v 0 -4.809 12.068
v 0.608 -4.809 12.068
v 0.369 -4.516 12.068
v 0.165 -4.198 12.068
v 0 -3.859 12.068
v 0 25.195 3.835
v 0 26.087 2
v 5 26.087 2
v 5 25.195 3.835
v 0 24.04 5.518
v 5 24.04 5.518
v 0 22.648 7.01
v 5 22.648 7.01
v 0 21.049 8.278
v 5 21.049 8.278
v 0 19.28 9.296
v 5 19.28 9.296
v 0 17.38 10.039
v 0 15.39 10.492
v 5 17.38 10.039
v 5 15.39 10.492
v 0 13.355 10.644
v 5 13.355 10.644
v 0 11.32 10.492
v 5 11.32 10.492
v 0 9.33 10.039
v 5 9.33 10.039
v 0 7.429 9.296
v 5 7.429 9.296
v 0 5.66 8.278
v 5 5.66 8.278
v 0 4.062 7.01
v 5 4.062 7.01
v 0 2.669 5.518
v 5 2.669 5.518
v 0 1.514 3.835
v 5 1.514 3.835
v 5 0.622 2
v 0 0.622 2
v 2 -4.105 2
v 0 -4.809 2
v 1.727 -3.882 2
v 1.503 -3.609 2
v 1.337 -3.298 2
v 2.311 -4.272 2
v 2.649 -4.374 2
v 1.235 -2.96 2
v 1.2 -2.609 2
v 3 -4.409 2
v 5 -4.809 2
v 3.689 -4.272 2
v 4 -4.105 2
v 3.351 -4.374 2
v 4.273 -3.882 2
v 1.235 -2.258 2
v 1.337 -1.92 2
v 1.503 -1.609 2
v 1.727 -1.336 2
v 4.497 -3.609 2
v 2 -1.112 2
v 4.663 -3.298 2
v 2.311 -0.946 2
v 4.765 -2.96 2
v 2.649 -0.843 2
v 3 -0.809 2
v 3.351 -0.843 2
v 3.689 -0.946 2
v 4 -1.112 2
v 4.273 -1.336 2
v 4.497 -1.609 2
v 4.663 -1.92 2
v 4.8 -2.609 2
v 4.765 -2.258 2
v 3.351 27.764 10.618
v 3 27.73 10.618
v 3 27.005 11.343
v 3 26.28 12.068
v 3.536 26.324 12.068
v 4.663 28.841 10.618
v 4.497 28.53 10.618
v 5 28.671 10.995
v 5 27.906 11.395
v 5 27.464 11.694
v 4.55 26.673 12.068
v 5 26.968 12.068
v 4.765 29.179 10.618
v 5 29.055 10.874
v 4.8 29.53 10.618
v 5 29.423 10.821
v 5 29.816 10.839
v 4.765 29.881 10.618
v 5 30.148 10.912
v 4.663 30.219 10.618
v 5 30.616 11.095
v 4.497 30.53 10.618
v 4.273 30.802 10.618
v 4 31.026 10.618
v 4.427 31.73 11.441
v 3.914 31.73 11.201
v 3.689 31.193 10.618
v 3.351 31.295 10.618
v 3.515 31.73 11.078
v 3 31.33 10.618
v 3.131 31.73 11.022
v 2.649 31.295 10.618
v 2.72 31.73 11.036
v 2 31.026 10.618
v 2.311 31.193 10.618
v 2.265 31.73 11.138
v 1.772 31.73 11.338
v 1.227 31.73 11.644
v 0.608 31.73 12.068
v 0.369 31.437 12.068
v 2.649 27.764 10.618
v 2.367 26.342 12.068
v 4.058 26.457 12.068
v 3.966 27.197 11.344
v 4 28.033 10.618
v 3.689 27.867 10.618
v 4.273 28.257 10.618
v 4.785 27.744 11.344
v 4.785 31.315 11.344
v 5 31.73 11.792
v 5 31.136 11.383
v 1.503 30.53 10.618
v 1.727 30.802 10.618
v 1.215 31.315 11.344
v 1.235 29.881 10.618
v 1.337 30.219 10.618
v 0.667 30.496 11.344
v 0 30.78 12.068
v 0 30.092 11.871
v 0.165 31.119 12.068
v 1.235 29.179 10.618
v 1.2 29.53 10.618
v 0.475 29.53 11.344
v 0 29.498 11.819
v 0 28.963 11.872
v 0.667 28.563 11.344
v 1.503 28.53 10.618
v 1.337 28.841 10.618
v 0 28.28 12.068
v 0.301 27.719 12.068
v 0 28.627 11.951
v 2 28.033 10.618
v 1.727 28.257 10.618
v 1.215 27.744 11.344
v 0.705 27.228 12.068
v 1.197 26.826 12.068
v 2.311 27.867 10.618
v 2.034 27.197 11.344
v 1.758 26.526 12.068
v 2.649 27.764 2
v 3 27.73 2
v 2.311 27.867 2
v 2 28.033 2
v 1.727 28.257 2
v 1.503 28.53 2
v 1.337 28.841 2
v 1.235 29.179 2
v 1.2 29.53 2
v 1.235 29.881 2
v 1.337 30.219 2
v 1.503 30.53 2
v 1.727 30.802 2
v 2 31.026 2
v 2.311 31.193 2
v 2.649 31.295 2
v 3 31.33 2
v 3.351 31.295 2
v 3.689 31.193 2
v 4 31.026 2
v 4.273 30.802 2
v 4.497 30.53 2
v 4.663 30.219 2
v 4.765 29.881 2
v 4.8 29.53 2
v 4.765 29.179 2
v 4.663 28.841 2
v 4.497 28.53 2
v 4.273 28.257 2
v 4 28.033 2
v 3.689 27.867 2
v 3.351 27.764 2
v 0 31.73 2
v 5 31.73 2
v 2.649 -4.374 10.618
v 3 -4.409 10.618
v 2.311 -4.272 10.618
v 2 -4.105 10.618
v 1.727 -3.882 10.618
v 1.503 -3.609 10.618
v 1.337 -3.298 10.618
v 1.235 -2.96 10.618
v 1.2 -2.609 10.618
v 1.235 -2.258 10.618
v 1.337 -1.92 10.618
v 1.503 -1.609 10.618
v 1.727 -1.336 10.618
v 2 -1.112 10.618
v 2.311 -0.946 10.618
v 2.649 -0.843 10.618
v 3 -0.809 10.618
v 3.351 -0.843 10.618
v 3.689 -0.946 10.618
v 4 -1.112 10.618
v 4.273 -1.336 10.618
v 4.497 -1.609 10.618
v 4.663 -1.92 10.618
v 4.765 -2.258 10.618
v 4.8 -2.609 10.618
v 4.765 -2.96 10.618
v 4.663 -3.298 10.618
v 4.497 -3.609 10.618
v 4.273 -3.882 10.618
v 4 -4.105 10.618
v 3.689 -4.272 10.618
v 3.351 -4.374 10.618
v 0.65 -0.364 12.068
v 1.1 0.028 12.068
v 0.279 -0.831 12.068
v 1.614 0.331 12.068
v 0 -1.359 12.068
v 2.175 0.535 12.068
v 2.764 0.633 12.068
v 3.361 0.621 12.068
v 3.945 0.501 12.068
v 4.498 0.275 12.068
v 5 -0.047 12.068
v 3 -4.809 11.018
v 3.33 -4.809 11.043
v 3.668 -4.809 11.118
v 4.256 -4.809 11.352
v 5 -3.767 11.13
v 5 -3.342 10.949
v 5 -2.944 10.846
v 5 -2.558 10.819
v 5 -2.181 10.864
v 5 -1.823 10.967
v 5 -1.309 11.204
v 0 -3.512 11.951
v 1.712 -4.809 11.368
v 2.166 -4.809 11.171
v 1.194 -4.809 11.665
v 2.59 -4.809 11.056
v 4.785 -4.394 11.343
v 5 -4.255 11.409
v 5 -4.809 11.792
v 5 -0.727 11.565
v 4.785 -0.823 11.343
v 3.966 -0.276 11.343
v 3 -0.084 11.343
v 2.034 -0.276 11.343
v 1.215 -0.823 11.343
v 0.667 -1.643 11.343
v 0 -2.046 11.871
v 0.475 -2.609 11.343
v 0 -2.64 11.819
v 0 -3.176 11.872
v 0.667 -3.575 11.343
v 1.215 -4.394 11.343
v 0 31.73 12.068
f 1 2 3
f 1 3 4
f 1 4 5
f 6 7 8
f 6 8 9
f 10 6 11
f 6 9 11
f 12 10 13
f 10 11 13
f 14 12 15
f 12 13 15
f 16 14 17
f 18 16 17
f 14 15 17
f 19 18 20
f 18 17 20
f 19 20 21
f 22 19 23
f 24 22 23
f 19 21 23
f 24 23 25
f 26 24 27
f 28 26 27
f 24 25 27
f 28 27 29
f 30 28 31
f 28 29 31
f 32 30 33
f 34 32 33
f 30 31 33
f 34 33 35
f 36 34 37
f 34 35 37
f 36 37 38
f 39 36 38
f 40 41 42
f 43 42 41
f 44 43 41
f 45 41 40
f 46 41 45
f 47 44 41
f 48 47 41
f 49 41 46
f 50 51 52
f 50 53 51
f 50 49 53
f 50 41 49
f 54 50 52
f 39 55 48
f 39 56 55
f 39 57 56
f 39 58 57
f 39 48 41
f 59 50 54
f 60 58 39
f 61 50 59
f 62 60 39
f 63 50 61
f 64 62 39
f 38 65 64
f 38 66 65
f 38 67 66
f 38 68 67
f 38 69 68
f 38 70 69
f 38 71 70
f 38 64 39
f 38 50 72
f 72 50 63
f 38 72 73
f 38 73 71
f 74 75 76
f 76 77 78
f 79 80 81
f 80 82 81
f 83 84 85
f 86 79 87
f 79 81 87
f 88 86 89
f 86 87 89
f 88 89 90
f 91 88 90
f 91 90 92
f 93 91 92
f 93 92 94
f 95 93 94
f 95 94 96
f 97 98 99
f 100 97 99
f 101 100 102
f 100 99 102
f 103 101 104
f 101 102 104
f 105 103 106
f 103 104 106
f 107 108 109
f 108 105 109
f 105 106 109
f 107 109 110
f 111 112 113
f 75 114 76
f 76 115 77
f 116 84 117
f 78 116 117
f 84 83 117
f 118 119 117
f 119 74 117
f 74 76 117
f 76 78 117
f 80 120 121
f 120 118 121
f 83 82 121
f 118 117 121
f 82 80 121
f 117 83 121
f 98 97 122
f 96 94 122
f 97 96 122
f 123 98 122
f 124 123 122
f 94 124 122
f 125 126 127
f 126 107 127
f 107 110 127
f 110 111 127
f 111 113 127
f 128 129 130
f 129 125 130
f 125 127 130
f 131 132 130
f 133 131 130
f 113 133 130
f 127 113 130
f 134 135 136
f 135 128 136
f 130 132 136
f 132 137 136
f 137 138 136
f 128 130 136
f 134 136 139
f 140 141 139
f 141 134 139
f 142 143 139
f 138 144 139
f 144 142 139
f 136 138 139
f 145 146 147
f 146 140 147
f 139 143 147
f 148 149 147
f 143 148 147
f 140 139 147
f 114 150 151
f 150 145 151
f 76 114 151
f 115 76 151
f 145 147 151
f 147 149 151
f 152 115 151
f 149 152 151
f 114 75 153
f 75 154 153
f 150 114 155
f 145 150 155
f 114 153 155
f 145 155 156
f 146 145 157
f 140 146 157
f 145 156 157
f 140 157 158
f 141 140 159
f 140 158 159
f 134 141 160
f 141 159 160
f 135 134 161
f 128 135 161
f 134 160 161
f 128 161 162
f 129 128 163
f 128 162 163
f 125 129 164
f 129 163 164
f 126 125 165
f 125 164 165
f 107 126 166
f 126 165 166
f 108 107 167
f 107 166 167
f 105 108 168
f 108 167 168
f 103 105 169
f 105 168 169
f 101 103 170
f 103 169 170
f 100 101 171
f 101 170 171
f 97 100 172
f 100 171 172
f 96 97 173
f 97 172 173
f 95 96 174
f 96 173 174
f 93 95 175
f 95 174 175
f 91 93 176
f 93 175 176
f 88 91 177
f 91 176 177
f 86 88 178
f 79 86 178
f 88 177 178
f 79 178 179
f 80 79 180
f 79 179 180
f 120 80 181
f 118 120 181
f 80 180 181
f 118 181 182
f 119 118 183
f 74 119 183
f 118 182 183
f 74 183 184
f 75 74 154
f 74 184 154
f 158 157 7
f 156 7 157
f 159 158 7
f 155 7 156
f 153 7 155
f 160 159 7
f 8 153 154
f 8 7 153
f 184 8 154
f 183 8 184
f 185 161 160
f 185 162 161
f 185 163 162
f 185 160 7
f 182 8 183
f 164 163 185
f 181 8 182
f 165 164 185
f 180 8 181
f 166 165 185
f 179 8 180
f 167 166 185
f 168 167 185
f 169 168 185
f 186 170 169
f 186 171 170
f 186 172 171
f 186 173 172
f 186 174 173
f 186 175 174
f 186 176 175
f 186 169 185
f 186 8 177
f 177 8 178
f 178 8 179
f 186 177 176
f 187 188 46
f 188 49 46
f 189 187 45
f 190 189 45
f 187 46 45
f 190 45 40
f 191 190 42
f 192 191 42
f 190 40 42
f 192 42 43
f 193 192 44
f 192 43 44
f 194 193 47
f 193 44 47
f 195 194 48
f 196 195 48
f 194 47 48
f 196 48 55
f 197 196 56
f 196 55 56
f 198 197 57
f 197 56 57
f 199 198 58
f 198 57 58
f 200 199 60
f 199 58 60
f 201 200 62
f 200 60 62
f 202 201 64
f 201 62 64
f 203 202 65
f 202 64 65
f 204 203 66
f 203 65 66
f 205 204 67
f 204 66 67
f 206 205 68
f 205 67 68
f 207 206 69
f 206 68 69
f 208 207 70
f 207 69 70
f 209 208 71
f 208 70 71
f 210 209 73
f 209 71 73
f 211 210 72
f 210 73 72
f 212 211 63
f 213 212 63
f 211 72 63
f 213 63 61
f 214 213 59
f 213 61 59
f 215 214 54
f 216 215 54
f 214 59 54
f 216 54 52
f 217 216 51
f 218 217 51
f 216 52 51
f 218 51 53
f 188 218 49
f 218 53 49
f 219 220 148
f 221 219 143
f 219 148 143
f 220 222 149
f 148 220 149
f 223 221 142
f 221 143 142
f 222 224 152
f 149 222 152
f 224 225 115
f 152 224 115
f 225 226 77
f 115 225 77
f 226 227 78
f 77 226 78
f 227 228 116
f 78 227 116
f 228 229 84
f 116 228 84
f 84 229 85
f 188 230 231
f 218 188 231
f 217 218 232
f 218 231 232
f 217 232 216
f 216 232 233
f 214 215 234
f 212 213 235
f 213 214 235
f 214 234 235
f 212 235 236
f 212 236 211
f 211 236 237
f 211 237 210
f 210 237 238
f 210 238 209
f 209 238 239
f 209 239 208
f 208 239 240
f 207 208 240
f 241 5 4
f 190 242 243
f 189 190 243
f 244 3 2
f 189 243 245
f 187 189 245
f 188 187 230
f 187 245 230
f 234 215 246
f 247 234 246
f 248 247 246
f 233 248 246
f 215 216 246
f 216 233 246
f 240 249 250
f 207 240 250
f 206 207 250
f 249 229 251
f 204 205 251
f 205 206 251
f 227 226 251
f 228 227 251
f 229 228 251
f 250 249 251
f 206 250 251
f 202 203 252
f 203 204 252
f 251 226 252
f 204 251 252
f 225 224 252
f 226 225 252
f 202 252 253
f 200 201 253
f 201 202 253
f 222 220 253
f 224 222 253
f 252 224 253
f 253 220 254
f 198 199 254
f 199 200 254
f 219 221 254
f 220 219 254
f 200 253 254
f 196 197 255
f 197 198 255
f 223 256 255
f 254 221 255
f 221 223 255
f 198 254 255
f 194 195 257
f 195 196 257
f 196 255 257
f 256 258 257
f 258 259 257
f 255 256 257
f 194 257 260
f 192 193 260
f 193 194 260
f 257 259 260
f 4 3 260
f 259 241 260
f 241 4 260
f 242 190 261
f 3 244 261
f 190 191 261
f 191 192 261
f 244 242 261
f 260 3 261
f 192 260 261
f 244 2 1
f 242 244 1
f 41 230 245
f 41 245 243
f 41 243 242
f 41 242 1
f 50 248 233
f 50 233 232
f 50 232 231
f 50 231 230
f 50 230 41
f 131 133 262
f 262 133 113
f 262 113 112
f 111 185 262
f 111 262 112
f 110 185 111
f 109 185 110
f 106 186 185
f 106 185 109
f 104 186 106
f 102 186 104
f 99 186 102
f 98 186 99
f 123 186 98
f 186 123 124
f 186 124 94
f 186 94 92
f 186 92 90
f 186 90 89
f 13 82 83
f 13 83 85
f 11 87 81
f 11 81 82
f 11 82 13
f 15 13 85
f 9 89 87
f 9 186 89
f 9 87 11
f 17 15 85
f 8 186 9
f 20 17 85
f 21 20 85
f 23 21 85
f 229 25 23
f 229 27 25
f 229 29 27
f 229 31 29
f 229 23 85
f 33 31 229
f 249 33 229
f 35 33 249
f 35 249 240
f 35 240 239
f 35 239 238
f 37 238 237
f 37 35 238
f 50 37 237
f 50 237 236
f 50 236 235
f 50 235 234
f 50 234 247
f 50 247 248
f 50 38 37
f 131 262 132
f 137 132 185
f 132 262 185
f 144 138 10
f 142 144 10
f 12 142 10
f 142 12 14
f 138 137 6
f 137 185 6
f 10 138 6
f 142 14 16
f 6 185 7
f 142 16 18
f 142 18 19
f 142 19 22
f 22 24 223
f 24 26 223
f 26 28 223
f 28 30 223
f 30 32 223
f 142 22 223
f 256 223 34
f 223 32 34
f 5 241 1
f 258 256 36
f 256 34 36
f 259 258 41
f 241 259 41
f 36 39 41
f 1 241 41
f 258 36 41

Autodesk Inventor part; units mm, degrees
ref_plane "YZ Plane" through (0, 0, 0) normal (1, 0, 0) x (0, 1, 0)
ref_plane "XZ Plane" through (0, 0, 0) normal (0, 1, 0) x (-1, 0, 0)
ref_plane "Work Plane1" through (5, 13.3547, -3.0565) normal (1, 0, 0) x (0, -1, 0)
ref_plane "Work Plane2" through (0, -4.8088, -18.4315) normal (-1, 0, 0) x (0, 0, 1)
sketch "Sketch1" plane through (5, 13.3547, -3.0565) normal (1, 0, 0) x (0, -1, 0)
  arc A0 (6.1228, -3.0565) -> (-6.1228, -3.0565) centre (0, 0) ccw projected
  line L0 (6.1228, -3.0565) -> (18.1635, -3.0565) projected
  line L1 (18.1635, -3.0565) -> (18.1635, 15.375) projected
  line L2 (18.1635, 15.375) -> (-18.375, 15.375) projected
  line L3 (-18.375, 15.375) -> (-18.375, -3.0565) projected
  line L4 (-18.375, -3.0565) -> (-6.1228, -3.0565) projected
  circle A1 centre (8, 0) radius 1.0564 projected
  circle A2 centre (-8, 0) radius 1.0564 projected
  circle A3 centre (8, 0) radius 1.0564 projected
  circle A4 centre (-8, 0) radius 1.0564 projected
  circle A5 centre (0, 0) radius 5 projected
  circle A6 centre (0, 0) radius 13.7 projected
  line L5 (18.1635, 15.375) -> (18.1635, 1) projected
  line L6 (18.1635, 1) -> (13.6635, 1) projected
  arc A7 (13.6635, 1) -> (-13.6635, 1) centre (0, 0) ccw projected
  line L7 (-13.6635, 1) -> (-18.375, 1) projected
  line L8 (-18.375, 1) -> (-18.375, -15.125) projected
  line L9 (55.7975, -15.125) -> (-18.375, -15.125) projected
  line L10 (55.7975, -15.125) -> (55.7975, 5.375) projected
  line L11 (55.7975, 5.375) -> (48.7975, 5.375) projected
  line L12 (48.7975, 5.375) -> (48.7975, 15.375) projected
  line L13 (48.7975, 15.375) -> (18.1635, 15.375) projected
  line L14 (-18.375, -15.125) -> (18.1635, -15.125)
  line L15 (18.1635, -15.125) -> (18.1635, -5.0565)
  line L16 (18.1635, -5.0565) -> (-18.375, -5.0565)
  line L17 (-18.375, -5.0565) -> (-18.375, -15.125)
  circle A8 centre (0, 0) radius 9
  point P0 (13.3547, -3.0565)
  point P1 (7.4453, -5.0565)
  point P2 (-7.4453, -5.0565)
  point P3 (-18.375, -5.0565)
  point P4 (18.1635, -15.125)
  point P5 (12.7327, -5.0565)
  point P6 (-12.7327, -5.0565)
  dimension "d0" = 2
  dimension "d1" = 18
extrude "Extrusion1" add sketch "Sketch1" against normal up to surface (5 mm away) contours L16 L15 L9 L8 A6
sketch "Sketch2" plane through (5, -4.8088, 12.0685) normal (0, 0, 1) x (1, 0, 0)
  line L0 (-5, 4.8088) -> (0, 4.8088) projected
  line L1 (-5, 4.8088) -> (-5, 0) projected
  line L2 (-5, 0) -> (4.7, 0) projected
  line L3 (4.7, 12.0407) -> (4.7, 0) projected
  line L4 (0, 12.0407) -> (4.7, 12.0407) projected
  line L5 (0, 12.0407) -> (0, 4.8088) projected
  line L6 (-5, 36.5385) -> (4.7, 36.5385) projected
  line L7 (-5, 36.5385) -> (-5, 31.5181) projected
  line L8 (-5, 31.5181) -> (0, 31.5181) projected
  line L9 (0, 31.5181) -> (0, 24.2862) projected
  line L10 (0, 24.2862) -> (4.7, 24.2862) projected
  line L11 (4.7, 36.5385) -> (4.7, 24.2862) projected
  point P0 (-2, 2.2)
  point P1 (-2, 34.3385)
  dimension "d6" = 2.2
  dimension "d7" = 2.2
  dimension "d8" = 3
  dimension "d9" = 3
hole "Hole1" at (3, -2.6088, 12.0685) at (3, 29.5297, 12.0685) direction (0, 0, -1) diameter 3.6 end through all countersink diameter 6.5 countersink angle 90 clearance for "Countersunk Flat Head Screw ISO 2009/7046" size "M3" standard "ISO"
properties part number "right_motor_ceil_2"
